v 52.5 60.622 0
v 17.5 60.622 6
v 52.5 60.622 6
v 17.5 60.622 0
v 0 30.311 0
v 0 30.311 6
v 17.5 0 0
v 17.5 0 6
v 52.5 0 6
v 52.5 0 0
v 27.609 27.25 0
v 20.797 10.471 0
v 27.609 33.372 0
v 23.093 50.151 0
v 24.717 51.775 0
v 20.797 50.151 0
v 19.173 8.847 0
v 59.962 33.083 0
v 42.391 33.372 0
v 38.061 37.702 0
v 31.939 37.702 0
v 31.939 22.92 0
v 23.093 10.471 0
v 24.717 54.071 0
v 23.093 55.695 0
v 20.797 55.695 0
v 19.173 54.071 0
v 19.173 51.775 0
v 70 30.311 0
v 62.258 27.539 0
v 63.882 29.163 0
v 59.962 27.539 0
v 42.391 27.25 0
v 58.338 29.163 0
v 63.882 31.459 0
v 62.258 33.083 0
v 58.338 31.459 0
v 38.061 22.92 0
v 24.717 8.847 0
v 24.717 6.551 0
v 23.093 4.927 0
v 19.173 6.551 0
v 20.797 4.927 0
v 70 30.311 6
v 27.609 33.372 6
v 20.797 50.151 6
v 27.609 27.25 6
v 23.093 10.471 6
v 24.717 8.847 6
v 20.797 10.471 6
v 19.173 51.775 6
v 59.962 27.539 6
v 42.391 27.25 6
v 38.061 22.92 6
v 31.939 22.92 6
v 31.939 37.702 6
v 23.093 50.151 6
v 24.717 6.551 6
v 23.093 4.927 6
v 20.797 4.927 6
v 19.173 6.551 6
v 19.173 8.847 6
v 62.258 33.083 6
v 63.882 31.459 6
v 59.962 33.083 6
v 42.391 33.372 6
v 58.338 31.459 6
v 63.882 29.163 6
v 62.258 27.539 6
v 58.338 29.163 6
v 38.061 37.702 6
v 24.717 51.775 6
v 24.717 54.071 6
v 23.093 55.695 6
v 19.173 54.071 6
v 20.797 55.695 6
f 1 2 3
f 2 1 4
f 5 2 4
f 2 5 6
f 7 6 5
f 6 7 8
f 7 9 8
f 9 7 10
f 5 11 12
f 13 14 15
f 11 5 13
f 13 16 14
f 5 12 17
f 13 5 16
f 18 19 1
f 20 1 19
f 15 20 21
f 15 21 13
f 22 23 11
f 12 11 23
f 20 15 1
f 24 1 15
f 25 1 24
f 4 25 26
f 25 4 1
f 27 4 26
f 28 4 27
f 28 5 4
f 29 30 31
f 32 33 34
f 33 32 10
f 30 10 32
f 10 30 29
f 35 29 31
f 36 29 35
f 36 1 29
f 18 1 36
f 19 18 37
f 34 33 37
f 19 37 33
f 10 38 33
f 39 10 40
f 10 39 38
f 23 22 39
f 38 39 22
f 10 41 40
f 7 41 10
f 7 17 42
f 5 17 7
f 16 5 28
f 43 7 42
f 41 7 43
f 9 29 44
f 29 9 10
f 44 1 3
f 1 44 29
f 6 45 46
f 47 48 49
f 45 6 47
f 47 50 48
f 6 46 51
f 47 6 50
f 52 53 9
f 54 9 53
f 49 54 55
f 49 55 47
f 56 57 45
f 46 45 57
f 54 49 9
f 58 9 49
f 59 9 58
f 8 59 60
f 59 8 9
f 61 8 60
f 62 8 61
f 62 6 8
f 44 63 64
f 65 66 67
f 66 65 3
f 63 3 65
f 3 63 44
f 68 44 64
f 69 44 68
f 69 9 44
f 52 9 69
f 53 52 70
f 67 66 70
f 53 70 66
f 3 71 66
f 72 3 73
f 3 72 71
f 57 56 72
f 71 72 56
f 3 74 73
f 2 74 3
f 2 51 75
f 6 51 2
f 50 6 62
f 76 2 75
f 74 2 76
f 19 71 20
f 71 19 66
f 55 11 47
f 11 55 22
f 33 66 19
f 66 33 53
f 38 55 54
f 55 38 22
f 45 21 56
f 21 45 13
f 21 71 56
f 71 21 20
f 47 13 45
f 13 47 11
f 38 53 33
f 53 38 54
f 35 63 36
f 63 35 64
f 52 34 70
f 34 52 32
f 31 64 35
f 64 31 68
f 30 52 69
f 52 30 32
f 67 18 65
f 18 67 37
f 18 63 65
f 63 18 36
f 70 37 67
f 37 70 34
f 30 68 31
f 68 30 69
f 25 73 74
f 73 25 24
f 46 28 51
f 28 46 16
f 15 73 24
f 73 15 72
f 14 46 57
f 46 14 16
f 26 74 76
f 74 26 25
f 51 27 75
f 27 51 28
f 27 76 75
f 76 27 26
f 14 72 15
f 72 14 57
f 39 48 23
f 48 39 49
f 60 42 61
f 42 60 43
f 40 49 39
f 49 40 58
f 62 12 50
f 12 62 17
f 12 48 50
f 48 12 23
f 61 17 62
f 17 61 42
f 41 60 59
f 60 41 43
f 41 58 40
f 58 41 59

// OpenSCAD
$fn = 32;

// ----------------------------------------------------------------------
// Polygon plate: 6-gon R35, 3 bolt windows
// ----------------------------------------------------------------------

// --- parameters (mm) ---
sides = 6;                // number of polygon sides
plate_r = 35;             // circumscribed radius of the polygon
bore_r = 8;               // centre bore radius
bolts = 3;                // number of bolt windows
ring_r = 26.11;           // bolt-circle radius
bolt_r = 3;               // bolt window radius
plate_t = 6;              // plate thickness, Z (extrusion height)

plate_d = 2 * plate_r;  // circumscribed diameter
bore_d = 2 * bore_r;  // centre bore diameter
bolt_d = 2 * bolt_r;  // bolt window diameter
ring_d = 2 * ring_r;  // bolt-circle diameter

profile = [[70, 30.311], [52.5, 60.622], [17.5, 60.622], [0, 30.311], [17.5, 0], [52.5, 0]];  // primary outline, 6 points, counter clockwise
void_1 = [[42.391, 33.372], [38.061, 37.702], [31.939, 37.702], [27.609, 33.372], [27.609, 27.25], [31.939, 22.92], [38.061, 22.92], [42.391, 27.25]];  // centre bore, 8 points
void_2 = [[63.882, 31.459], [62.258, 33.083], [59.962, 33.083], [58.338, 31.459], [58.338, 29.163], [59.962, 27.539], [62.258, 27.539], [63.882, 29.163]];  // bolt window 1, 8 points
void_3 = [[24.717, 54.071], [23.093, 55.695], [20.797, 55.695], [19.173, 54.071], [19.173, 51.775], [20.797, 50.151], [23.093, 50.151], [24.717, 51.775]];  // bolt window 2, 8 points
void_4 = [[24.717, 8.847], [23.093, 10.471], [20.797, 10.471], [19.173, 8.847], [19.173, 6.551], [20.797, 4.927], [23.093, 4.927], [24.717, 6.551]];  // bolt window 3, 8 points

// --- the one profile operation ---
difference() {
  linear_extrude(height = plate_t) polygon(points = profile);
  translate([0, 0, -1])
    linear_extrude(height = plate_t + 2) polygon(points = void_1);
  translate([0, 0, -1])
    linear_extrude(height = plate_t + 2) polygon(points = void_2);
  translate([0, 0, -1])
    linear_extrude(height = plate_t + 2) polygon(points = void_3);
  translate([0, 0, -1])
    linear_extrude(height = plate_t + 2) polygon(points = void_4);
}
